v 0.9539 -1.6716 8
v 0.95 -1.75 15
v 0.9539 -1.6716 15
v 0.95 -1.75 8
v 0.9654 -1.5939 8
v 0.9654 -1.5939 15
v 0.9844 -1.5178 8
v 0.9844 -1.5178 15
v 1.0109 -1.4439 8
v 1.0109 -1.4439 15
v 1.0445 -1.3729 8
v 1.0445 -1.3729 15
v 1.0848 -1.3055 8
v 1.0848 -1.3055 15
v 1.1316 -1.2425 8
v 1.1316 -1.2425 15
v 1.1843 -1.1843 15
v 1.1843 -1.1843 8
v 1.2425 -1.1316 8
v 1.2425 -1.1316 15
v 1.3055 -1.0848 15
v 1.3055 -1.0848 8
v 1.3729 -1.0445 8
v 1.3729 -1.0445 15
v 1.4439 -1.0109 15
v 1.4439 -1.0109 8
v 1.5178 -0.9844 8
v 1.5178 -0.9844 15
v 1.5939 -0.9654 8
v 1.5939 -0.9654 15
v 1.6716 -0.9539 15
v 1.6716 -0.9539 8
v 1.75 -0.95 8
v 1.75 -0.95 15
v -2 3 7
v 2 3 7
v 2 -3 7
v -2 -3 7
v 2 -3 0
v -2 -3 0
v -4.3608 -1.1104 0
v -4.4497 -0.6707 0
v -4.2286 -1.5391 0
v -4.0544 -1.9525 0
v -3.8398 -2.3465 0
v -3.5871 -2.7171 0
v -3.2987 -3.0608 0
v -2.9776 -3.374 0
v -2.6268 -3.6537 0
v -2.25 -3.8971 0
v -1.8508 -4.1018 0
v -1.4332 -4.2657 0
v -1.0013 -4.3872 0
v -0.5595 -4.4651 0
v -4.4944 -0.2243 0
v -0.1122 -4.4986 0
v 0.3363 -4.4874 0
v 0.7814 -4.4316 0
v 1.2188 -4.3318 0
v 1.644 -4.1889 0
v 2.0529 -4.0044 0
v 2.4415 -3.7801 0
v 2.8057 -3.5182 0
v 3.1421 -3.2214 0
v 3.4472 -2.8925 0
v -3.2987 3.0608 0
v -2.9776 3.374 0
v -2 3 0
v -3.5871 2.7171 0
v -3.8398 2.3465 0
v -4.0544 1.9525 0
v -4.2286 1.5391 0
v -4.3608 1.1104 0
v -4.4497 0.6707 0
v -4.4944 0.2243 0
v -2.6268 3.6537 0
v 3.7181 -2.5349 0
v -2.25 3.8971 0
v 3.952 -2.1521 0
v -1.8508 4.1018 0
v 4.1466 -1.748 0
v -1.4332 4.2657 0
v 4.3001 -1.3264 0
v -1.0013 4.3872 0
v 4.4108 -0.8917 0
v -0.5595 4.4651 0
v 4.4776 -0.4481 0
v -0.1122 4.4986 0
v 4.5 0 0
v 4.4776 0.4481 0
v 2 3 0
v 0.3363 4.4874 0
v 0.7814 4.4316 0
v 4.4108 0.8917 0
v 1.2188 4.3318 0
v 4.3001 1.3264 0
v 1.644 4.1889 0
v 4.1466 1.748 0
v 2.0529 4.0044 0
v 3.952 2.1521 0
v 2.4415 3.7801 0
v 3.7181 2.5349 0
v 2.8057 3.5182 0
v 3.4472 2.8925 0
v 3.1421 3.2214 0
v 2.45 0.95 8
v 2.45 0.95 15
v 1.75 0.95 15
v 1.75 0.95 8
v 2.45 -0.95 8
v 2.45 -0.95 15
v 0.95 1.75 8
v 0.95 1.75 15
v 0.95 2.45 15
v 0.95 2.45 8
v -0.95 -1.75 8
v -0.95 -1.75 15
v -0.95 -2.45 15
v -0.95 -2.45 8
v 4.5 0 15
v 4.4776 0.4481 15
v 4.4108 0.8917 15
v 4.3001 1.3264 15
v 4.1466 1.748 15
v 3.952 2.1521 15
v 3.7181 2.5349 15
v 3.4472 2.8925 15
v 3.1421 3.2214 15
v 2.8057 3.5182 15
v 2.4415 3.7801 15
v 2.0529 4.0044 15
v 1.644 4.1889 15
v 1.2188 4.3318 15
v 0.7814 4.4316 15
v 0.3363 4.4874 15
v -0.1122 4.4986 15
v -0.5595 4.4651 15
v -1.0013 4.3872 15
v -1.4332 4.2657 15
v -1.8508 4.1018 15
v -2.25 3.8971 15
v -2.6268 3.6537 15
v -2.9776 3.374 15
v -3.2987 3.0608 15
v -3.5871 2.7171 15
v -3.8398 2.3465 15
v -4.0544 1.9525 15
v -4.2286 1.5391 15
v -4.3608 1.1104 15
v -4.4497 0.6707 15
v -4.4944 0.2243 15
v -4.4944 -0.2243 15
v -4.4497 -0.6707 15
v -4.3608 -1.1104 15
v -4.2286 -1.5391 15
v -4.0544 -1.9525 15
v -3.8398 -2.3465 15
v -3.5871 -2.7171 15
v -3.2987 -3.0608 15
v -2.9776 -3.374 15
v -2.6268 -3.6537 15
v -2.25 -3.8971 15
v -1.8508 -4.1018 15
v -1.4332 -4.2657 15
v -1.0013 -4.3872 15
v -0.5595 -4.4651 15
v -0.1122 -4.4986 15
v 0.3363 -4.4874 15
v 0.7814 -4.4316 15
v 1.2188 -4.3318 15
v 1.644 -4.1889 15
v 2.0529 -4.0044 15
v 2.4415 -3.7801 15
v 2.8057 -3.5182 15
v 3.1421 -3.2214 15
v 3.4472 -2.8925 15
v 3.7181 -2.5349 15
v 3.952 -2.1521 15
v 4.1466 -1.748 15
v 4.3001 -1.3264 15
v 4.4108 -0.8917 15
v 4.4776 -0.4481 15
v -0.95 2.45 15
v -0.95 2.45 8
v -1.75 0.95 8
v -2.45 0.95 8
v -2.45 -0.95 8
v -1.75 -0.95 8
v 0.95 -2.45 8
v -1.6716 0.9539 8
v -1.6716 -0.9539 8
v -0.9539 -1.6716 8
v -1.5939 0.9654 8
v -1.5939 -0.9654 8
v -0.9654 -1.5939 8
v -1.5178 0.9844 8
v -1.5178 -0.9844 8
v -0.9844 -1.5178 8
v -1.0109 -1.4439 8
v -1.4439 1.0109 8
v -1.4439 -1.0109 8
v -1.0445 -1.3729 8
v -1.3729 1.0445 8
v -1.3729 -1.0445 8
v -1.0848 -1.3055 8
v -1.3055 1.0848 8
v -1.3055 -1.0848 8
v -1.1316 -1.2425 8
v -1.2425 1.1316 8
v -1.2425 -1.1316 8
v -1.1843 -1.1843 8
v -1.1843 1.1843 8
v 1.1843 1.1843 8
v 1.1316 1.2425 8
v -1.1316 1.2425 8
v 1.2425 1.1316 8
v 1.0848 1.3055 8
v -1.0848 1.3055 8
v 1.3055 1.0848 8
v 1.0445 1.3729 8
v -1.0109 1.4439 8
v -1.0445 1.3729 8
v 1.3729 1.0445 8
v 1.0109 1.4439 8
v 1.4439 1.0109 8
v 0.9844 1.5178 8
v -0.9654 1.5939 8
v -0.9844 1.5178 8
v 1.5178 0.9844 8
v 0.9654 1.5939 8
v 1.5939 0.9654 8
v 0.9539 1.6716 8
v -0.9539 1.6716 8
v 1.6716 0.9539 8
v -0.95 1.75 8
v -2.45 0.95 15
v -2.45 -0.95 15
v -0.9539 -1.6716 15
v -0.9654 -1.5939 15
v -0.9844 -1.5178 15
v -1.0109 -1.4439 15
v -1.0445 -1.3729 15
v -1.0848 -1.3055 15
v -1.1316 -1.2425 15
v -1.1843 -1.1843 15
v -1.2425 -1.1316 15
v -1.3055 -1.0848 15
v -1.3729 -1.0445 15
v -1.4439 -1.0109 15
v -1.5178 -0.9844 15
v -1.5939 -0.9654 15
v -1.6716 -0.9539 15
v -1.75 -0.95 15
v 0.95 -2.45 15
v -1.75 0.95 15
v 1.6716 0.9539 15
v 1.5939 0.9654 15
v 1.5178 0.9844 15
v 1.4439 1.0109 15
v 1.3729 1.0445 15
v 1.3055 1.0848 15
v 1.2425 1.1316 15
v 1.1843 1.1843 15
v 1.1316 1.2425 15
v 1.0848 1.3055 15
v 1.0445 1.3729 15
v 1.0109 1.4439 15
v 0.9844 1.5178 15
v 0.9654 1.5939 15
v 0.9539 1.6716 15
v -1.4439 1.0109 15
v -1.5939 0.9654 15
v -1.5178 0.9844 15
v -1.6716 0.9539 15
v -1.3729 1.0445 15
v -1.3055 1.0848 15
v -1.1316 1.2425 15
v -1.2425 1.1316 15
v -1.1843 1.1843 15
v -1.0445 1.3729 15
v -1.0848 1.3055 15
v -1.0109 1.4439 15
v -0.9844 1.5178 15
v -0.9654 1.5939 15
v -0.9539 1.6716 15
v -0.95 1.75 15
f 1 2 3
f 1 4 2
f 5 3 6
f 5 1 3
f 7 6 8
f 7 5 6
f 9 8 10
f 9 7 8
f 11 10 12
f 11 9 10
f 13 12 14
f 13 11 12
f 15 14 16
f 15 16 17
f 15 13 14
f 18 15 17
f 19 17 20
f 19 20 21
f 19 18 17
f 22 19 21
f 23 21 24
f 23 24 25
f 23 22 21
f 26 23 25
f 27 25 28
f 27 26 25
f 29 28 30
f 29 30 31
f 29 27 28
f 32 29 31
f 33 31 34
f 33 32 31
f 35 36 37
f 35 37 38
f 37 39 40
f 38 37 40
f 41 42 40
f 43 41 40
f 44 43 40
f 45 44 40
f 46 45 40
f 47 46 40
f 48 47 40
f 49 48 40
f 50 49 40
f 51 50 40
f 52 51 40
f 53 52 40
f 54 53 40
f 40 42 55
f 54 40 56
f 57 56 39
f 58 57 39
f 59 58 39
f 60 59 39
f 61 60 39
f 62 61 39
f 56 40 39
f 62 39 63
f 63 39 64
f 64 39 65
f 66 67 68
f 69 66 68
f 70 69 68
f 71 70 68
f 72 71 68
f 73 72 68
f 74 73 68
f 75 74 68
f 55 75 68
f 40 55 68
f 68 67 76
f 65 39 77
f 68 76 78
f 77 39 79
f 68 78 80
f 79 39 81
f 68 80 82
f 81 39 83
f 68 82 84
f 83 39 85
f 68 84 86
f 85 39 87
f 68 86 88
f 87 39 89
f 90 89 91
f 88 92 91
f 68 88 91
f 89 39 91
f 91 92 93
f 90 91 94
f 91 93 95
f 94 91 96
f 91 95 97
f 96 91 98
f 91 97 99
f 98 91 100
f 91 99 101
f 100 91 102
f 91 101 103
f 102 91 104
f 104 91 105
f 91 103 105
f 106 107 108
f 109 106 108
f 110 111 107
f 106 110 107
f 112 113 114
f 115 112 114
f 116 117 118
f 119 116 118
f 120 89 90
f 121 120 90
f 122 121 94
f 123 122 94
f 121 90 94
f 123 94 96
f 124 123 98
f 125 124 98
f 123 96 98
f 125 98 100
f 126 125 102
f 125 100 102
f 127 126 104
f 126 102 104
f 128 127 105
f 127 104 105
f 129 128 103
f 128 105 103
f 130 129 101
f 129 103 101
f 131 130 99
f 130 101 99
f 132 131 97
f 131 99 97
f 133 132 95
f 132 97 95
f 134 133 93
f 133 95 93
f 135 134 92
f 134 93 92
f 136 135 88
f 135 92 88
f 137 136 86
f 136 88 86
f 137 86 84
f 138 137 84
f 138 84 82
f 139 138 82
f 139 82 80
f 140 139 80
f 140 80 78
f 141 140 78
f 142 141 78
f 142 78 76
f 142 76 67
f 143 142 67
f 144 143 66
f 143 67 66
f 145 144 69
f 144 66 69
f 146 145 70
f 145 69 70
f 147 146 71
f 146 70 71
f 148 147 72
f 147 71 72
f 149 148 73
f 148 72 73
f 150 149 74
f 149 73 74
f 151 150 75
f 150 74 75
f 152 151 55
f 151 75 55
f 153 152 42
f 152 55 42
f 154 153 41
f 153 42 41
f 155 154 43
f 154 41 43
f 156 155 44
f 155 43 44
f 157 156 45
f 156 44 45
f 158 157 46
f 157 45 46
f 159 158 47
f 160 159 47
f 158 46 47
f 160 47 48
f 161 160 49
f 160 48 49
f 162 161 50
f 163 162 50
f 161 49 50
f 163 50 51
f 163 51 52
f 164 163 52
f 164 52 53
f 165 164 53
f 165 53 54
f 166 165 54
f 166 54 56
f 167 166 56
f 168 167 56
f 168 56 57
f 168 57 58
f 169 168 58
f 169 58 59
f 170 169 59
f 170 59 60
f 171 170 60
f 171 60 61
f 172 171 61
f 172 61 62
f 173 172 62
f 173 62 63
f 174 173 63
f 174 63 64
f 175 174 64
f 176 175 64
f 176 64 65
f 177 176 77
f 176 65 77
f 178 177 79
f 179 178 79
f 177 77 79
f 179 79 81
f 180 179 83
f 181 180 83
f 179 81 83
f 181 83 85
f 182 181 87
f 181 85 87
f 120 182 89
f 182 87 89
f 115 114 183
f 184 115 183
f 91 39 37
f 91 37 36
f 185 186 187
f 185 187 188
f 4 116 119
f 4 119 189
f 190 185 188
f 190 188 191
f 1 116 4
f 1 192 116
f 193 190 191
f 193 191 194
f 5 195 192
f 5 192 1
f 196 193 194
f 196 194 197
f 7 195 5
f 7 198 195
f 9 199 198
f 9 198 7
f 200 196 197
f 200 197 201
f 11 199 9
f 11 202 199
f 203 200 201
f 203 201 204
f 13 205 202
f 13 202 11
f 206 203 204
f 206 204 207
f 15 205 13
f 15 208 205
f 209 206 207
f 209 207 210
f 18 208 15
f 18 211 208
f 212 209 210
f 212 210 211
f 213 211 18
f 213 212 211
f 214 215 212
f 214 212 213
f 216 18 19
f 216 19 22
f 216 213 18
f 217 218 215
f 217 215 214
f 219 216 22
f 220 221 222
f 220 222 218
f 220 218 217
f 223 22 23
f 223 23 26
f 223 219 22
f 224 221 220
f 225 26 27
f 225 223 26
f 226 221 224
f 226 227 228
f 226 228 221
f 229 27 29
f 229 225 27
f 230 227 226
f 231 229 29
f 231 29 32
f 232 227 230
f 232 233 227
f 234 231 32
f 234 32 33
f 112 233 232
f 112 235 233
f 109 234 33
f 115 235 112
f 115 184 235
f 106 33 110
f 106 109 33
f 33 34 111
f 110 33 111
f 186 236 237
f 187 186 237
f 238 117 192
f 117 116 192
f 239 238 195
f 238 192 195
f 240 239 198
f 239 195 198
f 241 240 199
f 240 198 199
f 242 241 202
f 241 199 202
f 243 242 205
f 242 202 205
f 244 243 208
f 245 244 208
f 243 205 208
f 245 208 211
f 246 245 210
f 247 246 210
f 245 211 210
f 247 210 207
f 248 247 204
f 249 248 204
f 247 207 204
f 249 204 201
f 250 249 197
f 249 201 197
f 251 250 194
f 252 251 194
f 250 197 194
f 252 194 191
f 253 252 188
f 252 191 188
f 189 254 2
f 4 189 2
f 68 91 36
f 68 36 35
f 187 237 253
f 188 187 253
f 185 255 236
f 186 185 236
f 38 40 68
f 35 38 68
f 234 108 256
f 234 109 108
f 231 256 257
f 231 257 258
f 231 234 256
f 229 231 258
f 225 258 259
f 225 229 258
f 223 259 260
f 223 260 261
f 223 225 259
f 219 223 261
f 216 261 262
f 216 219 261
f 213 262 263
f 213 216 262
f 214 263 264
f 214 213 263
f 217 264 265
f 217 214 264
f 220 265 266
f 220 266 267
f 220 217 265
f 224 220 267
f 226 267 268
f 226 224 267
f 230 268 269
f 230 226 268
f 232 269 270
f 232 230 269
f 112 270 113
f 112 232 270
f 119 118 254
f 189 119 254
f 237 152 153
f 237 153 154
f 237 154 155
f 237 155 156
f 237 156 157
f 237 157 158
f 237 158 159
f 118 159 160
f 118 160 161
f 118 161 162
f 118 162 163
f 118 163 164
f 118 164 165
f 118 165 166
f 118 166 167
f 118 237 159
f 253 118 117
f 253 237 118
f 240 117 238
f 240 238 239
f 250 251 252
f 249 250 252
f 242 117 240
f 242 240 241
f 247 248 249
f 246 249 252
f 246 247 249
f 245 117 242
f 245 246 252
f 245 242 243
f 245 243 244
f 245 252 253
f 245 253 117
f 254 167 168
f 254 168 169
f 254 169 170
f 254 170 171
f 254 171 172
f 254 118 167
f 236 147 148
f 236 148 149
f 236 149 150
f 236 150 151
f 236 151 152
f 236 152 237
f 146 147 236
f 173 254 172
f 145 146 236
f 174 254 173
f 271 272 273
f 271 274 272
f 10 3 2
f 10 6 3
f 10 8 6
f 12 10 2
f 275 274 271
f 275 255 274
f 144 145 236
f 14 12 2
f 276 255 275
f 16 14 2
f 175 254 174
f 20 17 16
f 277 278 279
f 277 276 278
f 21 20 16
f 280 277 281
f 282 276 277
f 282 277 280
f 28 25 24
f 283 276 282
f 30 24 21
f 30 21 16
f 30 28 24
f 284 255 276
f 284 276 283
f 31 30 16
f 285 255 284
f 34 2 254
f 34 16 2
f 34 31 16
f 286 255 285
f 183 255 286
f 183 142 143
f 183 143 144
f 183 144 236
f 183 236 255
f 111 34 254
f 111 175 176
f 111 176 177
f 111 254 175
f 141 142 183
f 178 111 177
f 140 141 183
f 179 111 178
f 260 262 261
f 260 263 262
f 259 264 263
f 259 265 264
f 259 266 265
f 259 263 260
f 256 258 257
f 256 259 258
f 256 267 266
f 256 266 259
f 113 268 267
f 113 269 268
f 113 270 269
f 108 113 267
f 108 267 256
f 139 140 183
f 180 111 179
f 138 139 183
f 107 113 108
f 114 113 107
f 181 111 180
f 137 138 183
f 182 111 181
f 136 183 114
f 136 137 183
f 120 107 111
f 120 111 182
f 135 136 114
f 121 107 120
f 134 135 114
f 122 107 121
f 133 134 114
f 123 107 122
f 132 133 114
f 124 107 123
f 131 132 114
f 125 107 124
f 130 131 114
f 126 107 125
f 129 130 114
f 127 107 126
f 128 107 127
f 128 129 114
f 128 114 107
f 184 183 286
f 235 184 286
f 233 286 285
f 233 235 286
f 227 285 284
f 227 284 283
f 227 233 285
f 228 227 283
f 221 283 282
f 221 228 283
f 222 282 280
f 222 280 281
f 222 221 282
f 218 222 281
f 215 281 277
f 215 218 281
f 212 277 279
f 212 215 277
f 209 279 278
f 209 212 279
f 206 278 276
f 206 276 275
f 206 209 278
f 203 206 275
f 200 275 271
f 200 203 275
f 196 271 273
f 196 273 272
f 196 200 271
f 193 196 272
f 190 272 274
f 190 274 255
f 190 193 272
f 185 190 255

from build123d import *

# Parameters (mm, degrees)
SKETCH1_R           = 4.5
BOSS_EXTRUDE1_DEPTH = 15
SKETCH2_W           = 4
SKETCH2_H           = 6
CUT_EXTRUDE1_DEPTH  = 7
CUT_EXTRUDE2_DEPTH  = 7
FILLET3_R           = 0.8


with BuildPart() as part:
    # Sketch1 → Boss-Extrude1 (new body)
    with BuildSketch(Plane.XY):
        Circle(SKETCH1_R)
    extrude(amount=BOSS_EXTRUDE1_DEPTH)

    # Sketch2 → Cut-Extrude1 (cut)
    with BuildSketch(Plane(origin=(0, 0, 0), x_dir=(-1, 0, 0), z_dir=(0, 0, -1))):
        Rectangle(SKETCH2_W, SKETCH2_H)
    extrude(amount=-CUT_EXTRUDE1_DEPTH, mode=Mode.SUBTRACT)

    # Sketch3 → Cut-Extrude2 (cut)
    with BuildSketch(Plane.XY.offset(15)):
        Polygon((-0.95, -0.95), (-0.95, -2.45), (0.95, -2.45), (0.95, -0.95), (2.45, -0.95), (2.45, 0.95), (0.95, 0.95), (0.95, 2.45), (-0.95, 2.45), (-0.95, 0.95), (-2.45, 0.95), (-2.45, -0.95), align=None)
    extrude(amount=-CUT_EXTRUDE2_DEPTH, mode=Mode.SUBTRACT)

    # Fillet3
    fillet3_edges = [part.edges().sort_by_distance(p)[0] for p in [
        (0.95, -0.95, 11.5),
        (-0.95, -0.95, 11.5),
        (-0.95, 0.95, 11.5),
        (0.95, 0.95, 11.5),
    ]]
    fillet(fillet3_edges, radius=FILLET3_R)


solid = part.part
